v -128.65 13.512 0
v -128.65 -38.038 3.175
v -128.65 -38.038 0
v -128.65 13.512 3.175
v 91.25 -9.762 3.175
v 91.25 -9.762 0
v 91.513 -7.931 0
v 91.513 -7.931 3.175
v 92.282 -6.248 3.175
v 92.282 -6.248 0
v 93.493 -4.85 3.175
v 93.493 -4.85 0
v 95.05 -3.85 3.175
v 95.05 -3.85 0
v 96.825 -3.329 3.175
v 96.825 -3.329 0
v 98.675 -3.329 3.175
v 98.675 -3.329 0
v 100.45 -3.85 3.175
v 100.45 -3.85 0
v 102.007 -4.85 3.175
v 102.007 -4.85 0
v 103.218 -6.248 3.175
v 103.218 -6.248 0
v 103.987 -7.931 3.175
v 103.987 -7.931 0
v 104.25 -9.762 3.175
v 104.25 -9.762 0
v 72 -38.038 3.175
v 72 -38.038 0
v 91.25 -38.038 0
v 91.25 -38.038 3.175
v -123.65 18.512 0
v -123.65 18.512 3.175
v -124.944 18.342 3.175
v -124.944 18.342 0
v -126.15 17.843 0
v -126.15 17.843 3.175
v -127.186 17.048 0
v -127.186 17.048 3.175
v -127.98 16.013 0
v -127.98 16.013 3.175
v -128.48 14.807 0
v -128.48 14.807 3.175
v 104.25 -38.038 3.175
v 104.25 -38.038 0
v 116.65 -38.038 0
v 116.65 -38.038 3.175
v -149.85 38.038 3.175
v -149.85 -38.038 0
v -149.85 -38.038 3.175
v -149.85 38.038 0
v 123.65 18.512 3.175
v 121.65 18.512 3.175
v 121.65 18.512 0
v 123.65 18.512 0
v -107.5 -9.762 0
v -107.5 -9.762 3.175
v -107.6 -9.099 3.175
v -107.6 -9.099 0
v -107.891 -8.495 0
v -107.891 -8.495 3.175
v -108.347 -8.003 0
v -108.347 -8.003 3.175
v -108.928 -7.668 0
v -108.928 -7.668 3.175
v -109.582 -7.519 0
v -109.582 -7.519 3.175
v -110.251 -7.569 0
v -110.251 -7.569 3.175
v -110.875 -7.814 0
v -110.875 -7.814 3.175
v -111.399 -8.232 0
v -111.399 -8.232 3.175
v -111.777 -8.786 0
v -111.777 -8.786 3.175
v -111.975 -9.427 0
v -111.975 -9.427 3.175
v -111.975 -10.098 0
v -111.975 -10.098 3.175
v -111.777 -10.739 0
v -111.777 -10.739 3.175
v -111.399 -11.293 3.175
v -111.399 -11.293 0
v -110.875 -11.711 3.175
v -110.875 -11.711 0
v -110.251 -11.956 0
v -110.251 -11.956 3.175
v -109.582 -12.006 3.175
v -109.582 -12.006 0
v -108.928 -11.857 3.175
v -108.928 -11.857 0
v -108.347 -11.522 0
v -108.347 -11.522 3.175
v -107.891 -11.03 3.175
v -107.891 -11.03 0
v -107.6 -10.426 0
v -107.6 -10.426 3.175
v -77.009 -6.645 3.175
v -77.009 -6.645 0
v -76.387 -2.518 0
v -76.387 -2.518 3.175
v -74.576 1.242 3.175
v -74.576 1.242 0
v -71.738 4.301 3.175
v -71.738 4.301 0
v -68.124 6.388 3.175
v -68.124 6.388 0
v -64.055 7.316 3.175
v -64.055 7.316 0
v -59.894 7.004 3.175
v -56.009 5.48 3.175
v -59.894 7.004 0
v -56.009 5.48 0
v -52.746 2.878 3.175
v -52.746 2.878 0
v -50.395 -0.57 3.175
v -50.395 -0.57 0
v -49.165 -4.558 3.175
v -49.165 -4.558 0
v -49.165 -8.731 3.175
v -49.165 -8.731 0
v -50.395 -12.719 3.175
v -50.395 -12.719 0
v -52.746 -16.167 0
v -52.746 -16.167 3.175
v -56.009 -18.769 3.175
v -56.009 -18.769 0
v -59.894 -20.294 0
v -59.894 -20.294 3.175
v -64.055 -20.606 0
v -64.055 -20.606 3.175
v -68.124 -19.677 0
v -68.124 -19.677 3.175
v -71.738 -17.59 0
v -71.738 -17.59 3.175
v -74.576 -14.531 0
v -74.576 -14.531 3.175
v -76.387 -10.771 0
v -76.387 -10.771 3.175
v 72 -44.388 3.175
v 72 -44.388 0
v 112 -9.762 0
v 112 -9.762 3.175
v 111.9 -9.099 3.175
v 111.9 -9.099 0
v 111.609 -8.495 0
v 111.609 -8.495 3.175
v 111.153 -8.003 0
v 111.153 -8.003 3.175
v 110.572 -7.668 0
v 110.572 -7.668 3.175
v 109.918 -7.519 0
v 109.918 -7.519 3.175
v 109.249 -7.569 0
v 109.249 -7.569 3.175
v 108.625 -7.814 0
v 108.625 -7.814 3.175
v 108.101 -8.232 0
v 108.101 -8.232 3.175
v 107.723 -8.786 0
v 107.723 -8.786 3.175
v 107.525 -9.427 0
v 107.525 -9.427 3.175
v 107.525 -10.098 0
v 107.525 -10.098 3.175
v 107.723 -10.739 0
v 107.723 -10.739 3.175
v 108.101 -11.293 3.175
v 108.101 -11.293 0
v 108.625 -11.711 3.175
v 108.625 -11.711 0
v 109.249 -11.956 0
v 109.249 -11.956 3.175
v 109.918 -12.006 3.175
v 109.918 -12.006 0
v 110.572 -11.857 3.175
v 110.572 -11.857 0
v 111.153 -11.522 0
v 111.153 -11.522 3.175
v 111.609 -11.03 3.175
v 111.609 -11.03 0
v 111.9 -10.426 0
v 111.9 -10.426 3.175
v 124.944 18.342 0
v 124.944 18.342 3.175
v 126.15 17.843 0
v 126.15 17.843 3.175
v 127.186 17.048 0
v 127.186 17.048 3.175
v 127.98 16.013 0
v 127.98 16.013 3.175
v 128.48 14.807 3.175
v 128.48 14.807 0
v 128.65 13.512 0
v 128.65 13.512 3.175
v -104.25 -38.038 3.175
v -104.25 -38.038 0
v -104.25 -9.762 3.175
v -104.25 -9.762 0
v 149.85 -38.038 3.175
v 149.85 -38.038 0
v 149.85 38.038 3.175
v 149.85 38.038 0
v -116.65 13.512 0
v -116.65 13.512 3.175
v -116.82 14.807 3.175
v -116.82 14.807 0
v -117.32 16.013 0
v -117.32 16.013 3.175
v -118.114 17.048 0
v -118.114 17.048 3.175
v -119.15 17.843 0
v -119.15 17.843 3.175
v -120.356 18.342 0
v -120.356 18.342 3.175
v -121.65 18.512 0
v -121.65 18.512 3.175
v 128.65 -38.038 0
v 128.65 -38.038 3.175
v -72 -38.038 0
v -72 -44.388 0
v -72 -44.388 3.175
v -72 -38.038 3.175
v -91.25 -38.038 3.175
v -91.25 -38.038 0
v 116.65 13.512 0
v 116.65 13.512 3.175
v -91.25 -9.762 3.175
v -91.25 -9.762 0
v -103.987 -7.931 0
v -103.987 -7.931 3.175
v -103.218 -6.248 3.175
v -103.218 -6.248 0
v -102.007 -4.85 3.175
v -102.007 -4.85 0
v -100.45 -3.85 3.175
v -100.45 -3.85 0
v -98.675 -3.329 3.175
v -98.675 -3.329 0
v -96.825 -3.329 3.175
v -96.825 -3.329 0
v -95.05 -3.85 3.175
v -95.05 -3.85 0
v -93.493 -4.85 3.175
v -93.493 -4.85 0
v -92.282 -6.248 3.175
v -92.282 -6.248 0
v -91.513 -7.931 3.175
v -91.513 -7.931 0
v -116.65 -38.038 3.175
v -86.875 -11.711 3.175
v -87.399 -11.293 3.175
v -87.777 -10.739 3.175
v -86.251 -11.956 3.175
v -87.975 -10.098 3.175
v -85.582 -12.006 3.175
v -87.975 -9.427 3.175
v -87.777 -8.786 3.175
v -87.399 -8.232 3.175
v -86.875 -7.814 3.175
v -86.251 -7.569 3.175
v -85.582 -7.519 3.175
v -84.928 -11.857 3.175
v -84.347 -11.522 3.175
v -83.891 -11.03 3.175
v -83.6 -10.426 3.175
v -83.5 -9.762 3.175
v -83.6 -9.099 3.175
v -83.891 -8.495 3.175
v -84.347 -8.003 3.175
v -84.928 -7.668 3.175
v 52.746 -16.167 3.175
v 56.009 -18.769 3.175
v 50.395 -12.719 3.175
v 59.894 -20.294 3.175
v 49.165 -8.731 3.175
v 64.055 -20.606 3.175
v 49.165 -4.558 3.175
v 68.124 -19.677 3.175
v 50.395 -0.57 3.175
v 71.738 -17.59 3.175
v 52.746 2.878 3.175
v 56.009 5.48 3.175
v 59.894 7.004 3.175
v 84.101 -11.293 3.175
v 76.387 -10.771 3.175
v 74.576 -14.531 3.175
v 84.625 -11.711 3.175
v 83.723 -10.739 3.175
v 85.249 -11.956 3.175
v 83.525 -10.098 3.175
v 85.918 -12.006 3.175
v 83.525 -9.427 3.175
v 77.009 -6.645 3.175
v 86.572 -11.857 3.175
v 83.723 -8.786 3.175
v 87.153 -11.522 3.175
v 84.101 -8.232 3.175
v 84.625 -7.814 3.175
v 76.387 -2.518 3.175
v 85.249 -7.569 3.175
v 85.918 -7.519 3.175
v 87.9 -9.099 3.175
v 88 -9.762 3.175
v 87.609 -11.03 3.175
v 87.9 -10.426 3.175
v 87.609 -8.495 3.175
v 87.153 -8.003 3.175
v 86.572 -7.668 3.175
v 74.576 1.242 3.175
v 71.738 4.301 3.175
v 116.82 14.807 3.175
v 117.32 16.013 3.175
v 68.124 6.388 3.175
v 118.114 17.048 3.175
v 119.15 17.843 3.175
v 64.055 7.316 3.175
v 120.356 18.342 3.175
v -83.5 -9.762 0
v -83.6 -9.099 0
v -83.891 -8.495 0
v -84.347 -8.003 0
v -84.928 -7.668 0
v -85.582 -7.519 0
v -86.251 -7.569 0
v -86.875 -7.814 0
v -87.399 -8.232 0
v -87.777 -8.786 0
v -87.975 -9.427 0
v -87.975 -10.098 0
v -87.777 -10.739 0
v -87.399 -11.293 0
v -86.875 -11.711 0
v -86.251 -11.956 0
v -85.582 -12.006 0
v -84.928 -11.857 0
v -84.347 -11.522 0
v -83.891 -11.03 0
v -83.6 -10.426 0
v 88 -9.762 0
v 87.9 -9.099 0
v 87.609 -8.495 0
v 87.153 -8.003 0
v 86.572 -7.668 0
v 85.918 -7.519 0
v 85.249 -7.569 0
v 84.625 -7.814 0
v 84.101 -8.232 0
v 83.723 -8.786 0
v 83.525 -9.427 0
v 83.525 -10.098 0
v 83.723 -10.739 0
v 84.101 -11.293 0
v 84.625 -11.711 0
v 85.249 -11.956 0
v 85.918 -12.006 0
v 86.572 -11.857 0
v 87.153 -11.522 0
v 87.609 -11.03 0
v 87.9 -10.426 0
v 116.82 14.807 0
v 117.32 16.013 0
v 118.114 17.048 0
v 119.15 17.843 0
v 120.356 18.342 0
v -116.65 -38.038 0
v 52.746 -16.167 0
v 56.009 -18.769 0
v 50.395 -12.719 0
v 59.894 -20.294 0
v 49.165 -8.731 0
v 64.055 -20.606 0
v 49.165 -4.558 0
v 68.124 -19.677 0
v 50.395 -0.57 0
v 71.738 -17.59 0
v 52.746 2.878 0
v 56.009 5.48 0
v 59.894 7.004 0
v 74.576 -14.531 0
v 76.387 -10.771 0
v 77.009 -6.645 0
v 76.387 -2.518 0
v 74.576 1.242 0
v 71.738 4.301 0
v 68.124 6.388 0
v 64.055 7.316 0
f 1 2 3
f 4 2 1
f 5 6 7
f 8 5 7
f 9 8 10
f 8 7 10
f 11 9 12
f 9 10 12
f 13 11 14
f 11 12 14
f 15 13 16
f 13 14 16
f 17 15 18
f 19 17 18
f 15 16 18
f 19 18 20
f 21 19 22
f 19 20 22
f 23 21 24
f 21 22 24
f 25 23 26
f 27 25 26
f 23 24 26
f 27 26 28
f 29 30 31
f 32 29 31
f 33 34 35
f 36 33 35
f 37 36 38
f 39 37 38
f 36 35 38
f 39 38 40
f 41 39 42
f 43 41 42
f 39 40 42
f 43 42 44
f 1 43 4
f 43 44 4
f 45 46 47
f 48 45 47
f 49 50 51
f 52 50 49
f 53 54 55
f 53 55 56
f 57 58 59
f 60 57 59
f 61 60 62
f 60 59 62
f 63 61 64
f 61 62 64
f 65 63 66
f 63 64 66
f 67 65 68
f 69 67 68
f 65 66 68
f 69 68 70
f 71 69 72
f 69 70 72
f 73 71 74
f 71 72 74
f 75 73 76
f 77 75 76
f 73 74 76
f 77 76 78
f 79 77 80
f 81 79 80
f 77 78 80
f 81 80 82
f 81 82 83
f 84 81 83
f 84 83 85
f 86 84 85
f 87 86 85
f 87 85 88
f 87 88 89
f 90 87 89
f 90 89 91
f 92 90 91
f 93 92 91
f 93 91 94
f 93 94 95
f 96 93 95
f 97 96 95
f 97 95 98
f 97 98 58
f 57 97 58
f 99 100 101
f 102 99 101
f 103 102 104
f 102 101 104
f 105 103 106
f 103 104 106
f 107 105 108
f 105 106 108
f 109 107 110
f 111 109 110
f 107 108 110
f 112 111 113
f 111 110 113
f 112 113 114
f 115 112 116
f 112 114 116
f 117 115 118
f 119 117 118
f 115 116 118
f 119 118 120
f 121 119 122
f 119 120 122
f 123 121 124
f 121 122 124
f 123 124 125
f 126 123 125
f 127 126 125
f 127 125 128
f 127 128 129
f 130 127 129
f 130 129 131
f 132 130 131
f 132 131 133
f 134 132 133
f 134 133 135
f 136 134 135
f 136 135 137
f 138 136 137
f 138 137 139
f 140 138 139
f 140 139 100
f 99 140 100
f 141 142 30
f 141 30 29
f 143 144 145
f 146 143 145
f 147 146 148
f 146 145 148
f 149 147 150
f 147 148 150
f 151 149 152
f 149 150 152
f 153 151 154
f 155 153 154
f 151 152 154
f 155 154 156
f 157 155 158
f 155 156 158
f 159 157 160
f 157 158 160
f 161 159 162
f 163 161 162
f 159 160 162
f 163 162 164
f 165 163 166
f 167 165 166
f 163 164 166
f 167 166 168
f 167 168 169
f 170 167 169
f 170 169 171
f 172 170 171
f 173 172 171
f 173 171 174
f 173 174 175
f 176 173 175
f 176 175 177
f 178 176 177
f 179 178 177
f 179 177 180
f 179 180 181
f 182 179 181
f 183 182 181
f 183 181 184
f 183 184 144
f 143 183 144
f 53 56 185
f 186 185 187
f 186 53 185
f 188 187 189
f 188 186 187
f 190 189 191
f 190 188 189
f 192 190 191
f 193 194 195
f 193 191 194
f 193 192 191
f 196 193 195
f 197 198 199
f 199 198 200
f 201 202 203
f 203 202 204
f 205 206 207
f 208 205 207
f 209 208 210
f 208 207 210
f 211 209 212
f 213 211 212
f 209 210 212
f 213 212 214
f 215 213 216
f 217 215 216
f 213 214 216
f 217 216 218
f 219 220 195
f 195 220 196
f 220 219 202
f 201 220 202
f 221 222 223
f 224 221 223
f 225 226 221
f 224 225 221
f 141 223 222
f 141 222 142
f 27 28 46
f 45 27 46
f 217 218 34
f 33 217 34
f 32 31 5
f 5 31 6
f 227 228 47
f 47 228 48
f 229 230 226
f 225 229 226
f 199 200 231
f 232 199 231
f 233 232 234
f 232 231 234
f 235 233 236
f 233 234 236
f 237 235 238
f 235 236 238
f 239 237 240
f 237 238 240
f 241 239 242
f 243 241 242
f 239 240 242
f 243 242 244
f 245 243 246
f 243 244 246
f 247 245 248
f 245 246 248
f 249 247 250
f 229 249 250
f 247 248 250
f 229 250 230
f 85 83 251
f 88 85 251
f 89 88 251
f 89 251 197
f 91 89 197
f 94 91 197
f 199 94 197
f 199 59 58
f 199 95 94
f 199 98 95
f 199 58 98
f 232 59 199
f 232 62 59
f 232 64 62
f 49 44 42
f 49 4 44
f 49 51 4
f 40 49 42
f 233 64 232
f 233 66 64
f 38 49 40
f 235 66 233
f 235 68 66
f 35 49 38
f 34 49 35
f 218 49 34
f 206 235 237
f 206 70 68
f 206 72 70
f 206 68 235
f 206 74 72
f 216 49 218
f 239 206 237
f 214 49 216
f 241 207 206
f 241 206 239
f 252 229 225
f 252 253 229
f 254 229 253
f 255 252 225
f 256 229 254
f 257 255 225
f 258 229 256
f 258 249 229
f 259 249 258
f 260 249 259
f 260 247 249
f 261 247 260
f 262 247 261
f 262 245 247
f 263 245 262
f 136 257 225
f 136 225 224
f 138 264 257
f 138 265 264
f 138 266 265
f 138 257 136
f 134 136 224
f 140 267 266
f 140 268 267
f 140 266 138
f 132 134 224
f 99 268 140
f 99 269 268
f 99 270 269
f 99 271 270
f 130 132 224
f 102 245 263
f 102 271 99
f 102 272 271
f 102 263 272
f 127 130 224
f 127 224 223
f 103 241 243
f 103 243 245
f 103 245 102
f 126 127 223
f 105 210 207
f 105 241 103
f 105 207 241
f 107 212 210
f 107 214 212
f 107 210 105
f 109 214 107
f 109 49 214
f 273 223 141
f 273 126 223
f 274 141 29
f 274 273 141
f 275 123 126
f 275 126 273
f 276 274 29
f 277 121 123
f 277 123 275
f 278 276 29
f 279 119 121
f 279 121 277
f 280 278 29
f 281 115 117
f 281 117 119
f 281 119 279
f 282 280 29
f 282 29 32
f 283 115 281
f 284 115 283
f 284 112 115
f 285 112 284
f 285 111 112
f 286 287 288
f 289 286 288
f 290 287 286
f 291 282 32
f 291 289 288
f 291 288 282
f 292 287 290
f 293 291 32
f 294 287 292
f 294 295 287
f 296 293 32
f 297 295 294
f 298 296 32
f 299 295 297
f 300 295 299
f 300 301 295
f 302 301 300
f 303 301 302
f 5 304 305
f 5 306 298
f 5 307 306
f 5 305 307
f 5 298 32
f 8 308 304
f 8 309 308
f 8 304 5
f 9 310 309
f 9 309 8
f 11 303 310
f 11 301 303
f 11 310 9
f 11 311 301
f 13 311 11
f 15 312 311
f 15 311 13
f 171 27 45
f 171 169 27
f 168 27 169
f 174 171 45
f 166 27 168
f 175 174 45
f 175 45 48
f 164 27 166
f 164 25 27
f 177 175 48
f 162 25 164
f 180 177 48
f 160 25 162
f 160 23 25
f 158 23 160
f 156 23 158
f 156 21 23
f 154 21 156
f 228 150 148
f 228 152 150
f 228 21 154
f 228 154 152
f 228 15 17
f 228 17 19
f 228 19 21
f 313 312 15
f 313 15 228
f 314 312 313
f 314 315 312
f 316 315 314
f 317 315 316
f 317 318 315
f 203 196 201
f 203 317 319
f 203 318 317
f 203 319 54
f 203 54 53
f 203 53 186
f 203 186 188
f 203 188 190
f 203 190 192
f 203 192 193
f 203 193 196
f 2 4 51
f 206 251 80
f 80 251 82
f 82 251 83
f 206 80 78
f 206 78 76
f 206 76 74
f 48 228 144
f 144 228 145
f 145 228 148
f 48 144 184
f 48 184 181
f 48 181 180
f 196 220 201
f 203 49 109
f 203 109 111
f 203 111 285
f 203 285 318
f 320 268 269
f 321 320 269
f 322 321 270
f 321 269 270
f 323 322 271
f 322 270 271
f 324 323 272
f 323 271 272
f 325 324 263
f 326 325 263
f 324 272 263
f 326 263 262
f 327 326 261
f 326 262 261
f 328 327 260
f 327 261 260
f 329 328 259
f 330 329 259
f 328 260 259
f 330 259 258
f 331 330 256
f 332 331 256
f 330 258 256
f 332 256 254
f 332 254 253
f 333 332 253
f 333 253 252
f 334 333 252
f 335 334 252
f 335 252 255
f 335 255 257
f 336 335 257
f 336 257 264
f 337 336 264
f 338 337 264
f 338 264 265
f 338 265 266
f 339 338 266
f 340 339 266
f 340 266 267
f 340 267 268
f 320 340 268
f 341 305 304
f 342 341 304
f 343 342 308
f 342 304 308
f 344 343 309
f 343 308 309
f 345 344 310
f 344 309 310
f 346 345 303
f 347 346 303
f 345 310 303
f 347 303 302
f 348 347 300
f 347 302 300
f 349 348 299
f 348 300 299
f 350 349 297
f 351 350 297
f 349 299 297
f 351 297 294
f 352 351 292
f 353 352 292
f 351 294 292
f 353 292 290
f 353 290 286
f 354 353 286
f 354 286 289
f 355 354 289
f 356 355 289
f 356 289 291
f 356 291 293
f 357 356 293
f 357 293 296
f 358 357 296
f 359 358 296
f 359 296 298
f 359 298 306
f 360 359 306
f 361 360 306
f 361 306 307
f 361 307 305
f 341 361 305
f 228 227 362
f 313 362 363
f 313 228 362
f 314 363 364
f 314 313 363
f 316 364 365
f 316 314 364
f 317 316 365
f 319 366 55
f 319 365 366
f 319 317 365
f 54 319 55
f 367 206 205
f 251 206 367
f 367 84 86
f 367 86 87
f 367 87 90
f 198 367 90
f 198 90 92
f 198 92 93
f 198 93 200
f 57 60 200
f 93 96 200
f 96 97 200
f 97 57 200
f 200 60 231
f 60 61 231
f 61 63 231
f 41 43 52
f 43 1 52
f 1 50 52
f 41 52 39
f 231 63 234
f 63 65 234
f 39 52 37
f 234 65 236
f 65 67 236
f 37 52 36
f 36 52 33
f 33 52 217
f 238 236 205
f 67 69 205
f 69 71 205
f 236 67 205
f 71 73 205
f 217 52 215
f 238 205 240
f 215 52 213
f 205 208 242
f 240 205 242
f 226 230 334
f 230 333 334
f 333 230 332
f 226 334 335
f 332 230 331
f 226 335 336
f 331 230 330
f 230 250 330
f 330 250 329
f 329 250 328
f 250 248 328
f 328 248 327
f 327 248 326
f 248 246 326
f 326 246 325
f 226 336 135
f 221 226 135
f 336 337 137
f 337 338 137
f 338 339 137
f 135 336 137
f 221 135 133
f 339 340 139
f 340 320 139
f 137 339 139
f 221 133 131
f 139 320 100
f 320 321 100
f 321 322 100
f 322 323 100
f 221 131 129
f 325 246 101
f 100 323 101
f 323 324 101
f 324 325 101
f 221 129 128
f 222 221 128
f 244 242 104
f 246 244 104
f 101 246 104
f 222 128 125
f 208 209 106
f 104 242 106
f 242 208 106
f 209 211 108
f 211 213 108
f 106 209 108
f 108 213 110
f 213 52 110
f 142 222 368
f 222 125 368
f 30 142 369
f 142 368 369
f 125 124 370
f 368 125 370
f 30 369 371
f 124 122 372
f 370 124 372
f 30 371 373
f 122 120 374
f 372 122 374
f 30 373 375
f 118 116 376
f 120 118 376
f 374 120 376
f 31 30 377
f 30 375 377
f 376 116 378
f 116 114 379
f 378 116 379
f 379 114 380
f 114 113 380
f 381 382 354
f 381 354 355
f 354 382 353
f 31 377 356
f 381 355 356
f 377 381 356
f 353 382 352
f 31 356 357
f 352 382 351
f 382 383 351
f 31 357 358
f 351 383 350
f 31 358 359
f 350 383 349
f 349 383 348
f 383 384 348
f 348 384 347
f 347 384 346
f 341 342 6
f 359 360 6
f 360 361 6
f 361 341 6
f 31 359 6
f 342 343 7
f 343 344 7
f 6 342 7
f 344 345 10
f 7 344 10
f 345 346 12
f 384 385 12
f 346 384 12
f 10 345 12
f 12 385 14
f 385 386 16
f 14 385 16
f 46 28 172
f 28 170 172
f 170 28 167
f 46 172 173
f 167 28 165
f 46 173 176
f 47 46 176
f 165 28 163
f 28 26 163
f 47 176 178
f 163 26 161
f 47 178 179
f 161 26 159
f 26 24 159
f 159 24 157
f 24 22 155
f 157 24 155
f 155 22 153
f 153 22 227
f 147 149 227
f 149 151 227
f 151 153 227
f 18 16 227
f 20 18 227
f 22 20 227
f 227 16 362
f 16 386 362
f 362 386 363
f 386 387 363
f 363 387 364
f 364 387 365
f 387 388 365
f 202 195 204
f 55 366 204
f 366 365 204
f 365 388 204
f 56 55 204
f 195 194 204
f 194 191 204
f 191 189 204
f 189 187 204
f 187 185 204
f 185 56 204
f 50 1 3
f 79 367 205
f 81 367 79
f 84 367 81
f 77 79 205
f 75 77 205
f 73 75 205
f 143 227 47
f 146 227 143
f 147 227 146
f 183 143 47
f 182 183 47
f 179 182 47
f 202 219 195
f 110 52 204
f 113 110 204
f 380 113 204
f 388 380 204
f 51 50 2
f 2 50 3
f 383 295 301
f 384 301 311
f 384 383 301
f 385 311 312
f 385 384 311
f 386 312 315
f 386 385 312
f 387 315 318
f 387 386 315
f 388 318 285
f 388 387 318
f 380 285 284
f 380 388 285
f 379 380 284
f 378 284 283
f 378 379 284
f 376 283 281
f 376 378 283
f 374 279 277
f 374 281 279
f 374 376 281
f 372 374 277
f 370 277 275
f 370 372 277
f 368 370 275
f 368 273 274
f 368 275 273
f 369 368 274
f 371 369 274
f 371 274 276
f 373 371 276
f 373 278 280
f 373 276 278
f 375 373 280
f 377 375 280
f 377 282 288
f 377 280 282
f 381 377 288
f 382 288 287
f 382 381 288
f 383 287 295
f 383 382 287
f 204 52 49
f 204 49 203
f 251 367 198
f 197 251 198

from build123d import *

# Parameters (mm, degrees)
SKETCH1_W            = 299.7
SKETCH1_H            = 76.075
BOSS_EXTRUDE1_DEPTH  = 3.175
CUT_EXTRUDE4_DEPTH   = 155.634907221
SKETCH3_R            = 6.5
CUT_EXTRUDE5_DEPTH   = 155.634907221
M4_CLEARANCE_HOLE1_D = 4.5
SKETCH12_W           = 144
SKETCH12_H           = 3.175
BOSS_EXTRUDE2_DEPTH  = 6.35
SKETCH13_R           = 14
CUT_EXTRUDE6_DEPTH   = 157.318115653


with BuildPart() as part:
    # Sketch1 → Boss-Extrude1 (new body)
    with BuildSketch(Plane.XY):
        Rectangle(SKETCH1_W, SKETCH1_H)
    extrude(amount=BOSS_EXTRUDE1_DEPTH)

    # Sketch8 → Cut-Extrude4 (cut, through all)
    with BuildSketch(Plane.XY.offset(3.175)):
        with BuildLine():
            Line((121.65, 18.5125), (123.65, 18.5125))
            ThreePointArc((123.65, 18.5125), (127.185533906, 17.048033906), (128.65, 13.5125))
            Line((128.65, 13.5125), (128.65, -27.282435401))
            ThreePointArc((128.65, -27.282435401), (127.185533906, -30.817969307), (123.65, -32.282435401))
            Line((123.65, -32.282435401), (121.65, -32.282435401))
            ThreePointArc((121.65, -32.282435401), (118.114466094, -30.817969307), (116.65, -27.282435401))
            Line((116.65, -27.282435401), (116.65, 13.5125))
            ThreePointArc((116.65, 13.5125), (118.114466094, 17.048033906), (121.65, 18.5125))
        make_face()
        with BuildLine():
            Line((128.65, -38.0375), (128.65, -27.282435401))
            ThreePointArc((128.65, -27.282435401), (127.185533906, -30.817969307), (123.65, -32.282435401))
            Line((123.65, -32.282435401), (121.65, -32.282435401))
            ThreePointArc((121.65, -32.282435401), (118.114466094, -30.817969307), (116.65, -27.282435401))
            Line((116.65, -27.282435401), (116.65, -38.0375))
            Line((116.65, -38.0375), (128.65, -38.0375))
        make_face()
    cut_extrude4 = extrude(amount=-CUT_EXTRUDE4_DEPTH, mode=Mode.SUBTRACT)

    # Mirror3: Cut-Extrude4 across plane
    add(cut_extrude4.mirror(Plane(origin=(0, 0, 0), x_dir=(0, 0, 1), z_dir=(1, 0, 0))), mode=Mode.SUBTRACT)

    # Sketch3 → Cut-Extrude5 (cut, through all)
    with BuildSketch(Plane(origin=(0, 0, 0), x_dir=(-1, 0, 0), z_dir=(0, 0, -1))):
        with Locations((-97.75, -9.7625)):
            Circle(SKETCH3_R)
        with BuildLine():
            Line((-104.25, -38.0375), (-91.25, -38.0375))
            Line((-91.25, -38.0375), (-91.25, -9.7625))
            ThreePointArc((-91.25, -9.7625), (-97.75, -16.2625), (-104.25, -9.7625))
            Line((-104.25, -9.7625), (-104.25, -38.0375))
        make_face()
        with Locations((97.75, -9.7625)):
            Circle(SKETCH3_R)
        with BuildLine():
            Line((91.25, -38.0375), (104.25, -38.0375))
            Line((104.25, -38.0375), (104.25, -9.7625))
            ThreePointArc((104.25, -9.7625), (97.75, -16.2625), (91.25, -9.7625))
            Line((91.25, -9.7625), (91.25, -38.0375))
        make_face()
    extrude(amount=-CUT_EXTRUDE5_DEPTH, mode=Mode.SUBTRACT)

    # M4 Clearance Hole1 (through all)
    with Locations(Plane(origin=(0, 0, 0), x_dir=(-1, 0, 0), z_dir=(0, 0, -1))):
        with Locations((-85.75, -9.7625), (-109.75, -9.7625), (109.75, -9.7625), (85.75, -9.7625)):
            Hole(M4_CLEARANCE_HOLE1_D / 2)

    # Sketch12 → Boss-Extrude2 (add)
    with BuildSketch(Plane.XZ.offset(38.0375)):
        with Locations((0, 1.5875)):
            Rectangle(SKETCH12_W, SKETCH12_H)
    extrude(amount=BOSS_EXTRUDE2_DEPTH)

    # Sketch13 → Cut-Extrude6 (cut, through all)
    with BuildSketch(Plane(origin=(0, 0, 0), x_dir=(-1, 0, 0), z_dir=(0, 0, -1))):
        with Locations((63.008899223, -6.644651545)):
            Circle(SKETCH13_R)
    cut_extrude6 = extrude(amount=-CUT_EXTRUDE6_DEPTH, mode=Mode.SUBTRACT)

    # Mirror4: Cut-Extrude6 across plane
    add(cut_extrude6.mirror(Plane(origin=(0, 0, 0), x_dir=(0, 0, 1), z_dir=(1, 0, 0))), mode=Mode.SUBTRACT)


solid = part.part
